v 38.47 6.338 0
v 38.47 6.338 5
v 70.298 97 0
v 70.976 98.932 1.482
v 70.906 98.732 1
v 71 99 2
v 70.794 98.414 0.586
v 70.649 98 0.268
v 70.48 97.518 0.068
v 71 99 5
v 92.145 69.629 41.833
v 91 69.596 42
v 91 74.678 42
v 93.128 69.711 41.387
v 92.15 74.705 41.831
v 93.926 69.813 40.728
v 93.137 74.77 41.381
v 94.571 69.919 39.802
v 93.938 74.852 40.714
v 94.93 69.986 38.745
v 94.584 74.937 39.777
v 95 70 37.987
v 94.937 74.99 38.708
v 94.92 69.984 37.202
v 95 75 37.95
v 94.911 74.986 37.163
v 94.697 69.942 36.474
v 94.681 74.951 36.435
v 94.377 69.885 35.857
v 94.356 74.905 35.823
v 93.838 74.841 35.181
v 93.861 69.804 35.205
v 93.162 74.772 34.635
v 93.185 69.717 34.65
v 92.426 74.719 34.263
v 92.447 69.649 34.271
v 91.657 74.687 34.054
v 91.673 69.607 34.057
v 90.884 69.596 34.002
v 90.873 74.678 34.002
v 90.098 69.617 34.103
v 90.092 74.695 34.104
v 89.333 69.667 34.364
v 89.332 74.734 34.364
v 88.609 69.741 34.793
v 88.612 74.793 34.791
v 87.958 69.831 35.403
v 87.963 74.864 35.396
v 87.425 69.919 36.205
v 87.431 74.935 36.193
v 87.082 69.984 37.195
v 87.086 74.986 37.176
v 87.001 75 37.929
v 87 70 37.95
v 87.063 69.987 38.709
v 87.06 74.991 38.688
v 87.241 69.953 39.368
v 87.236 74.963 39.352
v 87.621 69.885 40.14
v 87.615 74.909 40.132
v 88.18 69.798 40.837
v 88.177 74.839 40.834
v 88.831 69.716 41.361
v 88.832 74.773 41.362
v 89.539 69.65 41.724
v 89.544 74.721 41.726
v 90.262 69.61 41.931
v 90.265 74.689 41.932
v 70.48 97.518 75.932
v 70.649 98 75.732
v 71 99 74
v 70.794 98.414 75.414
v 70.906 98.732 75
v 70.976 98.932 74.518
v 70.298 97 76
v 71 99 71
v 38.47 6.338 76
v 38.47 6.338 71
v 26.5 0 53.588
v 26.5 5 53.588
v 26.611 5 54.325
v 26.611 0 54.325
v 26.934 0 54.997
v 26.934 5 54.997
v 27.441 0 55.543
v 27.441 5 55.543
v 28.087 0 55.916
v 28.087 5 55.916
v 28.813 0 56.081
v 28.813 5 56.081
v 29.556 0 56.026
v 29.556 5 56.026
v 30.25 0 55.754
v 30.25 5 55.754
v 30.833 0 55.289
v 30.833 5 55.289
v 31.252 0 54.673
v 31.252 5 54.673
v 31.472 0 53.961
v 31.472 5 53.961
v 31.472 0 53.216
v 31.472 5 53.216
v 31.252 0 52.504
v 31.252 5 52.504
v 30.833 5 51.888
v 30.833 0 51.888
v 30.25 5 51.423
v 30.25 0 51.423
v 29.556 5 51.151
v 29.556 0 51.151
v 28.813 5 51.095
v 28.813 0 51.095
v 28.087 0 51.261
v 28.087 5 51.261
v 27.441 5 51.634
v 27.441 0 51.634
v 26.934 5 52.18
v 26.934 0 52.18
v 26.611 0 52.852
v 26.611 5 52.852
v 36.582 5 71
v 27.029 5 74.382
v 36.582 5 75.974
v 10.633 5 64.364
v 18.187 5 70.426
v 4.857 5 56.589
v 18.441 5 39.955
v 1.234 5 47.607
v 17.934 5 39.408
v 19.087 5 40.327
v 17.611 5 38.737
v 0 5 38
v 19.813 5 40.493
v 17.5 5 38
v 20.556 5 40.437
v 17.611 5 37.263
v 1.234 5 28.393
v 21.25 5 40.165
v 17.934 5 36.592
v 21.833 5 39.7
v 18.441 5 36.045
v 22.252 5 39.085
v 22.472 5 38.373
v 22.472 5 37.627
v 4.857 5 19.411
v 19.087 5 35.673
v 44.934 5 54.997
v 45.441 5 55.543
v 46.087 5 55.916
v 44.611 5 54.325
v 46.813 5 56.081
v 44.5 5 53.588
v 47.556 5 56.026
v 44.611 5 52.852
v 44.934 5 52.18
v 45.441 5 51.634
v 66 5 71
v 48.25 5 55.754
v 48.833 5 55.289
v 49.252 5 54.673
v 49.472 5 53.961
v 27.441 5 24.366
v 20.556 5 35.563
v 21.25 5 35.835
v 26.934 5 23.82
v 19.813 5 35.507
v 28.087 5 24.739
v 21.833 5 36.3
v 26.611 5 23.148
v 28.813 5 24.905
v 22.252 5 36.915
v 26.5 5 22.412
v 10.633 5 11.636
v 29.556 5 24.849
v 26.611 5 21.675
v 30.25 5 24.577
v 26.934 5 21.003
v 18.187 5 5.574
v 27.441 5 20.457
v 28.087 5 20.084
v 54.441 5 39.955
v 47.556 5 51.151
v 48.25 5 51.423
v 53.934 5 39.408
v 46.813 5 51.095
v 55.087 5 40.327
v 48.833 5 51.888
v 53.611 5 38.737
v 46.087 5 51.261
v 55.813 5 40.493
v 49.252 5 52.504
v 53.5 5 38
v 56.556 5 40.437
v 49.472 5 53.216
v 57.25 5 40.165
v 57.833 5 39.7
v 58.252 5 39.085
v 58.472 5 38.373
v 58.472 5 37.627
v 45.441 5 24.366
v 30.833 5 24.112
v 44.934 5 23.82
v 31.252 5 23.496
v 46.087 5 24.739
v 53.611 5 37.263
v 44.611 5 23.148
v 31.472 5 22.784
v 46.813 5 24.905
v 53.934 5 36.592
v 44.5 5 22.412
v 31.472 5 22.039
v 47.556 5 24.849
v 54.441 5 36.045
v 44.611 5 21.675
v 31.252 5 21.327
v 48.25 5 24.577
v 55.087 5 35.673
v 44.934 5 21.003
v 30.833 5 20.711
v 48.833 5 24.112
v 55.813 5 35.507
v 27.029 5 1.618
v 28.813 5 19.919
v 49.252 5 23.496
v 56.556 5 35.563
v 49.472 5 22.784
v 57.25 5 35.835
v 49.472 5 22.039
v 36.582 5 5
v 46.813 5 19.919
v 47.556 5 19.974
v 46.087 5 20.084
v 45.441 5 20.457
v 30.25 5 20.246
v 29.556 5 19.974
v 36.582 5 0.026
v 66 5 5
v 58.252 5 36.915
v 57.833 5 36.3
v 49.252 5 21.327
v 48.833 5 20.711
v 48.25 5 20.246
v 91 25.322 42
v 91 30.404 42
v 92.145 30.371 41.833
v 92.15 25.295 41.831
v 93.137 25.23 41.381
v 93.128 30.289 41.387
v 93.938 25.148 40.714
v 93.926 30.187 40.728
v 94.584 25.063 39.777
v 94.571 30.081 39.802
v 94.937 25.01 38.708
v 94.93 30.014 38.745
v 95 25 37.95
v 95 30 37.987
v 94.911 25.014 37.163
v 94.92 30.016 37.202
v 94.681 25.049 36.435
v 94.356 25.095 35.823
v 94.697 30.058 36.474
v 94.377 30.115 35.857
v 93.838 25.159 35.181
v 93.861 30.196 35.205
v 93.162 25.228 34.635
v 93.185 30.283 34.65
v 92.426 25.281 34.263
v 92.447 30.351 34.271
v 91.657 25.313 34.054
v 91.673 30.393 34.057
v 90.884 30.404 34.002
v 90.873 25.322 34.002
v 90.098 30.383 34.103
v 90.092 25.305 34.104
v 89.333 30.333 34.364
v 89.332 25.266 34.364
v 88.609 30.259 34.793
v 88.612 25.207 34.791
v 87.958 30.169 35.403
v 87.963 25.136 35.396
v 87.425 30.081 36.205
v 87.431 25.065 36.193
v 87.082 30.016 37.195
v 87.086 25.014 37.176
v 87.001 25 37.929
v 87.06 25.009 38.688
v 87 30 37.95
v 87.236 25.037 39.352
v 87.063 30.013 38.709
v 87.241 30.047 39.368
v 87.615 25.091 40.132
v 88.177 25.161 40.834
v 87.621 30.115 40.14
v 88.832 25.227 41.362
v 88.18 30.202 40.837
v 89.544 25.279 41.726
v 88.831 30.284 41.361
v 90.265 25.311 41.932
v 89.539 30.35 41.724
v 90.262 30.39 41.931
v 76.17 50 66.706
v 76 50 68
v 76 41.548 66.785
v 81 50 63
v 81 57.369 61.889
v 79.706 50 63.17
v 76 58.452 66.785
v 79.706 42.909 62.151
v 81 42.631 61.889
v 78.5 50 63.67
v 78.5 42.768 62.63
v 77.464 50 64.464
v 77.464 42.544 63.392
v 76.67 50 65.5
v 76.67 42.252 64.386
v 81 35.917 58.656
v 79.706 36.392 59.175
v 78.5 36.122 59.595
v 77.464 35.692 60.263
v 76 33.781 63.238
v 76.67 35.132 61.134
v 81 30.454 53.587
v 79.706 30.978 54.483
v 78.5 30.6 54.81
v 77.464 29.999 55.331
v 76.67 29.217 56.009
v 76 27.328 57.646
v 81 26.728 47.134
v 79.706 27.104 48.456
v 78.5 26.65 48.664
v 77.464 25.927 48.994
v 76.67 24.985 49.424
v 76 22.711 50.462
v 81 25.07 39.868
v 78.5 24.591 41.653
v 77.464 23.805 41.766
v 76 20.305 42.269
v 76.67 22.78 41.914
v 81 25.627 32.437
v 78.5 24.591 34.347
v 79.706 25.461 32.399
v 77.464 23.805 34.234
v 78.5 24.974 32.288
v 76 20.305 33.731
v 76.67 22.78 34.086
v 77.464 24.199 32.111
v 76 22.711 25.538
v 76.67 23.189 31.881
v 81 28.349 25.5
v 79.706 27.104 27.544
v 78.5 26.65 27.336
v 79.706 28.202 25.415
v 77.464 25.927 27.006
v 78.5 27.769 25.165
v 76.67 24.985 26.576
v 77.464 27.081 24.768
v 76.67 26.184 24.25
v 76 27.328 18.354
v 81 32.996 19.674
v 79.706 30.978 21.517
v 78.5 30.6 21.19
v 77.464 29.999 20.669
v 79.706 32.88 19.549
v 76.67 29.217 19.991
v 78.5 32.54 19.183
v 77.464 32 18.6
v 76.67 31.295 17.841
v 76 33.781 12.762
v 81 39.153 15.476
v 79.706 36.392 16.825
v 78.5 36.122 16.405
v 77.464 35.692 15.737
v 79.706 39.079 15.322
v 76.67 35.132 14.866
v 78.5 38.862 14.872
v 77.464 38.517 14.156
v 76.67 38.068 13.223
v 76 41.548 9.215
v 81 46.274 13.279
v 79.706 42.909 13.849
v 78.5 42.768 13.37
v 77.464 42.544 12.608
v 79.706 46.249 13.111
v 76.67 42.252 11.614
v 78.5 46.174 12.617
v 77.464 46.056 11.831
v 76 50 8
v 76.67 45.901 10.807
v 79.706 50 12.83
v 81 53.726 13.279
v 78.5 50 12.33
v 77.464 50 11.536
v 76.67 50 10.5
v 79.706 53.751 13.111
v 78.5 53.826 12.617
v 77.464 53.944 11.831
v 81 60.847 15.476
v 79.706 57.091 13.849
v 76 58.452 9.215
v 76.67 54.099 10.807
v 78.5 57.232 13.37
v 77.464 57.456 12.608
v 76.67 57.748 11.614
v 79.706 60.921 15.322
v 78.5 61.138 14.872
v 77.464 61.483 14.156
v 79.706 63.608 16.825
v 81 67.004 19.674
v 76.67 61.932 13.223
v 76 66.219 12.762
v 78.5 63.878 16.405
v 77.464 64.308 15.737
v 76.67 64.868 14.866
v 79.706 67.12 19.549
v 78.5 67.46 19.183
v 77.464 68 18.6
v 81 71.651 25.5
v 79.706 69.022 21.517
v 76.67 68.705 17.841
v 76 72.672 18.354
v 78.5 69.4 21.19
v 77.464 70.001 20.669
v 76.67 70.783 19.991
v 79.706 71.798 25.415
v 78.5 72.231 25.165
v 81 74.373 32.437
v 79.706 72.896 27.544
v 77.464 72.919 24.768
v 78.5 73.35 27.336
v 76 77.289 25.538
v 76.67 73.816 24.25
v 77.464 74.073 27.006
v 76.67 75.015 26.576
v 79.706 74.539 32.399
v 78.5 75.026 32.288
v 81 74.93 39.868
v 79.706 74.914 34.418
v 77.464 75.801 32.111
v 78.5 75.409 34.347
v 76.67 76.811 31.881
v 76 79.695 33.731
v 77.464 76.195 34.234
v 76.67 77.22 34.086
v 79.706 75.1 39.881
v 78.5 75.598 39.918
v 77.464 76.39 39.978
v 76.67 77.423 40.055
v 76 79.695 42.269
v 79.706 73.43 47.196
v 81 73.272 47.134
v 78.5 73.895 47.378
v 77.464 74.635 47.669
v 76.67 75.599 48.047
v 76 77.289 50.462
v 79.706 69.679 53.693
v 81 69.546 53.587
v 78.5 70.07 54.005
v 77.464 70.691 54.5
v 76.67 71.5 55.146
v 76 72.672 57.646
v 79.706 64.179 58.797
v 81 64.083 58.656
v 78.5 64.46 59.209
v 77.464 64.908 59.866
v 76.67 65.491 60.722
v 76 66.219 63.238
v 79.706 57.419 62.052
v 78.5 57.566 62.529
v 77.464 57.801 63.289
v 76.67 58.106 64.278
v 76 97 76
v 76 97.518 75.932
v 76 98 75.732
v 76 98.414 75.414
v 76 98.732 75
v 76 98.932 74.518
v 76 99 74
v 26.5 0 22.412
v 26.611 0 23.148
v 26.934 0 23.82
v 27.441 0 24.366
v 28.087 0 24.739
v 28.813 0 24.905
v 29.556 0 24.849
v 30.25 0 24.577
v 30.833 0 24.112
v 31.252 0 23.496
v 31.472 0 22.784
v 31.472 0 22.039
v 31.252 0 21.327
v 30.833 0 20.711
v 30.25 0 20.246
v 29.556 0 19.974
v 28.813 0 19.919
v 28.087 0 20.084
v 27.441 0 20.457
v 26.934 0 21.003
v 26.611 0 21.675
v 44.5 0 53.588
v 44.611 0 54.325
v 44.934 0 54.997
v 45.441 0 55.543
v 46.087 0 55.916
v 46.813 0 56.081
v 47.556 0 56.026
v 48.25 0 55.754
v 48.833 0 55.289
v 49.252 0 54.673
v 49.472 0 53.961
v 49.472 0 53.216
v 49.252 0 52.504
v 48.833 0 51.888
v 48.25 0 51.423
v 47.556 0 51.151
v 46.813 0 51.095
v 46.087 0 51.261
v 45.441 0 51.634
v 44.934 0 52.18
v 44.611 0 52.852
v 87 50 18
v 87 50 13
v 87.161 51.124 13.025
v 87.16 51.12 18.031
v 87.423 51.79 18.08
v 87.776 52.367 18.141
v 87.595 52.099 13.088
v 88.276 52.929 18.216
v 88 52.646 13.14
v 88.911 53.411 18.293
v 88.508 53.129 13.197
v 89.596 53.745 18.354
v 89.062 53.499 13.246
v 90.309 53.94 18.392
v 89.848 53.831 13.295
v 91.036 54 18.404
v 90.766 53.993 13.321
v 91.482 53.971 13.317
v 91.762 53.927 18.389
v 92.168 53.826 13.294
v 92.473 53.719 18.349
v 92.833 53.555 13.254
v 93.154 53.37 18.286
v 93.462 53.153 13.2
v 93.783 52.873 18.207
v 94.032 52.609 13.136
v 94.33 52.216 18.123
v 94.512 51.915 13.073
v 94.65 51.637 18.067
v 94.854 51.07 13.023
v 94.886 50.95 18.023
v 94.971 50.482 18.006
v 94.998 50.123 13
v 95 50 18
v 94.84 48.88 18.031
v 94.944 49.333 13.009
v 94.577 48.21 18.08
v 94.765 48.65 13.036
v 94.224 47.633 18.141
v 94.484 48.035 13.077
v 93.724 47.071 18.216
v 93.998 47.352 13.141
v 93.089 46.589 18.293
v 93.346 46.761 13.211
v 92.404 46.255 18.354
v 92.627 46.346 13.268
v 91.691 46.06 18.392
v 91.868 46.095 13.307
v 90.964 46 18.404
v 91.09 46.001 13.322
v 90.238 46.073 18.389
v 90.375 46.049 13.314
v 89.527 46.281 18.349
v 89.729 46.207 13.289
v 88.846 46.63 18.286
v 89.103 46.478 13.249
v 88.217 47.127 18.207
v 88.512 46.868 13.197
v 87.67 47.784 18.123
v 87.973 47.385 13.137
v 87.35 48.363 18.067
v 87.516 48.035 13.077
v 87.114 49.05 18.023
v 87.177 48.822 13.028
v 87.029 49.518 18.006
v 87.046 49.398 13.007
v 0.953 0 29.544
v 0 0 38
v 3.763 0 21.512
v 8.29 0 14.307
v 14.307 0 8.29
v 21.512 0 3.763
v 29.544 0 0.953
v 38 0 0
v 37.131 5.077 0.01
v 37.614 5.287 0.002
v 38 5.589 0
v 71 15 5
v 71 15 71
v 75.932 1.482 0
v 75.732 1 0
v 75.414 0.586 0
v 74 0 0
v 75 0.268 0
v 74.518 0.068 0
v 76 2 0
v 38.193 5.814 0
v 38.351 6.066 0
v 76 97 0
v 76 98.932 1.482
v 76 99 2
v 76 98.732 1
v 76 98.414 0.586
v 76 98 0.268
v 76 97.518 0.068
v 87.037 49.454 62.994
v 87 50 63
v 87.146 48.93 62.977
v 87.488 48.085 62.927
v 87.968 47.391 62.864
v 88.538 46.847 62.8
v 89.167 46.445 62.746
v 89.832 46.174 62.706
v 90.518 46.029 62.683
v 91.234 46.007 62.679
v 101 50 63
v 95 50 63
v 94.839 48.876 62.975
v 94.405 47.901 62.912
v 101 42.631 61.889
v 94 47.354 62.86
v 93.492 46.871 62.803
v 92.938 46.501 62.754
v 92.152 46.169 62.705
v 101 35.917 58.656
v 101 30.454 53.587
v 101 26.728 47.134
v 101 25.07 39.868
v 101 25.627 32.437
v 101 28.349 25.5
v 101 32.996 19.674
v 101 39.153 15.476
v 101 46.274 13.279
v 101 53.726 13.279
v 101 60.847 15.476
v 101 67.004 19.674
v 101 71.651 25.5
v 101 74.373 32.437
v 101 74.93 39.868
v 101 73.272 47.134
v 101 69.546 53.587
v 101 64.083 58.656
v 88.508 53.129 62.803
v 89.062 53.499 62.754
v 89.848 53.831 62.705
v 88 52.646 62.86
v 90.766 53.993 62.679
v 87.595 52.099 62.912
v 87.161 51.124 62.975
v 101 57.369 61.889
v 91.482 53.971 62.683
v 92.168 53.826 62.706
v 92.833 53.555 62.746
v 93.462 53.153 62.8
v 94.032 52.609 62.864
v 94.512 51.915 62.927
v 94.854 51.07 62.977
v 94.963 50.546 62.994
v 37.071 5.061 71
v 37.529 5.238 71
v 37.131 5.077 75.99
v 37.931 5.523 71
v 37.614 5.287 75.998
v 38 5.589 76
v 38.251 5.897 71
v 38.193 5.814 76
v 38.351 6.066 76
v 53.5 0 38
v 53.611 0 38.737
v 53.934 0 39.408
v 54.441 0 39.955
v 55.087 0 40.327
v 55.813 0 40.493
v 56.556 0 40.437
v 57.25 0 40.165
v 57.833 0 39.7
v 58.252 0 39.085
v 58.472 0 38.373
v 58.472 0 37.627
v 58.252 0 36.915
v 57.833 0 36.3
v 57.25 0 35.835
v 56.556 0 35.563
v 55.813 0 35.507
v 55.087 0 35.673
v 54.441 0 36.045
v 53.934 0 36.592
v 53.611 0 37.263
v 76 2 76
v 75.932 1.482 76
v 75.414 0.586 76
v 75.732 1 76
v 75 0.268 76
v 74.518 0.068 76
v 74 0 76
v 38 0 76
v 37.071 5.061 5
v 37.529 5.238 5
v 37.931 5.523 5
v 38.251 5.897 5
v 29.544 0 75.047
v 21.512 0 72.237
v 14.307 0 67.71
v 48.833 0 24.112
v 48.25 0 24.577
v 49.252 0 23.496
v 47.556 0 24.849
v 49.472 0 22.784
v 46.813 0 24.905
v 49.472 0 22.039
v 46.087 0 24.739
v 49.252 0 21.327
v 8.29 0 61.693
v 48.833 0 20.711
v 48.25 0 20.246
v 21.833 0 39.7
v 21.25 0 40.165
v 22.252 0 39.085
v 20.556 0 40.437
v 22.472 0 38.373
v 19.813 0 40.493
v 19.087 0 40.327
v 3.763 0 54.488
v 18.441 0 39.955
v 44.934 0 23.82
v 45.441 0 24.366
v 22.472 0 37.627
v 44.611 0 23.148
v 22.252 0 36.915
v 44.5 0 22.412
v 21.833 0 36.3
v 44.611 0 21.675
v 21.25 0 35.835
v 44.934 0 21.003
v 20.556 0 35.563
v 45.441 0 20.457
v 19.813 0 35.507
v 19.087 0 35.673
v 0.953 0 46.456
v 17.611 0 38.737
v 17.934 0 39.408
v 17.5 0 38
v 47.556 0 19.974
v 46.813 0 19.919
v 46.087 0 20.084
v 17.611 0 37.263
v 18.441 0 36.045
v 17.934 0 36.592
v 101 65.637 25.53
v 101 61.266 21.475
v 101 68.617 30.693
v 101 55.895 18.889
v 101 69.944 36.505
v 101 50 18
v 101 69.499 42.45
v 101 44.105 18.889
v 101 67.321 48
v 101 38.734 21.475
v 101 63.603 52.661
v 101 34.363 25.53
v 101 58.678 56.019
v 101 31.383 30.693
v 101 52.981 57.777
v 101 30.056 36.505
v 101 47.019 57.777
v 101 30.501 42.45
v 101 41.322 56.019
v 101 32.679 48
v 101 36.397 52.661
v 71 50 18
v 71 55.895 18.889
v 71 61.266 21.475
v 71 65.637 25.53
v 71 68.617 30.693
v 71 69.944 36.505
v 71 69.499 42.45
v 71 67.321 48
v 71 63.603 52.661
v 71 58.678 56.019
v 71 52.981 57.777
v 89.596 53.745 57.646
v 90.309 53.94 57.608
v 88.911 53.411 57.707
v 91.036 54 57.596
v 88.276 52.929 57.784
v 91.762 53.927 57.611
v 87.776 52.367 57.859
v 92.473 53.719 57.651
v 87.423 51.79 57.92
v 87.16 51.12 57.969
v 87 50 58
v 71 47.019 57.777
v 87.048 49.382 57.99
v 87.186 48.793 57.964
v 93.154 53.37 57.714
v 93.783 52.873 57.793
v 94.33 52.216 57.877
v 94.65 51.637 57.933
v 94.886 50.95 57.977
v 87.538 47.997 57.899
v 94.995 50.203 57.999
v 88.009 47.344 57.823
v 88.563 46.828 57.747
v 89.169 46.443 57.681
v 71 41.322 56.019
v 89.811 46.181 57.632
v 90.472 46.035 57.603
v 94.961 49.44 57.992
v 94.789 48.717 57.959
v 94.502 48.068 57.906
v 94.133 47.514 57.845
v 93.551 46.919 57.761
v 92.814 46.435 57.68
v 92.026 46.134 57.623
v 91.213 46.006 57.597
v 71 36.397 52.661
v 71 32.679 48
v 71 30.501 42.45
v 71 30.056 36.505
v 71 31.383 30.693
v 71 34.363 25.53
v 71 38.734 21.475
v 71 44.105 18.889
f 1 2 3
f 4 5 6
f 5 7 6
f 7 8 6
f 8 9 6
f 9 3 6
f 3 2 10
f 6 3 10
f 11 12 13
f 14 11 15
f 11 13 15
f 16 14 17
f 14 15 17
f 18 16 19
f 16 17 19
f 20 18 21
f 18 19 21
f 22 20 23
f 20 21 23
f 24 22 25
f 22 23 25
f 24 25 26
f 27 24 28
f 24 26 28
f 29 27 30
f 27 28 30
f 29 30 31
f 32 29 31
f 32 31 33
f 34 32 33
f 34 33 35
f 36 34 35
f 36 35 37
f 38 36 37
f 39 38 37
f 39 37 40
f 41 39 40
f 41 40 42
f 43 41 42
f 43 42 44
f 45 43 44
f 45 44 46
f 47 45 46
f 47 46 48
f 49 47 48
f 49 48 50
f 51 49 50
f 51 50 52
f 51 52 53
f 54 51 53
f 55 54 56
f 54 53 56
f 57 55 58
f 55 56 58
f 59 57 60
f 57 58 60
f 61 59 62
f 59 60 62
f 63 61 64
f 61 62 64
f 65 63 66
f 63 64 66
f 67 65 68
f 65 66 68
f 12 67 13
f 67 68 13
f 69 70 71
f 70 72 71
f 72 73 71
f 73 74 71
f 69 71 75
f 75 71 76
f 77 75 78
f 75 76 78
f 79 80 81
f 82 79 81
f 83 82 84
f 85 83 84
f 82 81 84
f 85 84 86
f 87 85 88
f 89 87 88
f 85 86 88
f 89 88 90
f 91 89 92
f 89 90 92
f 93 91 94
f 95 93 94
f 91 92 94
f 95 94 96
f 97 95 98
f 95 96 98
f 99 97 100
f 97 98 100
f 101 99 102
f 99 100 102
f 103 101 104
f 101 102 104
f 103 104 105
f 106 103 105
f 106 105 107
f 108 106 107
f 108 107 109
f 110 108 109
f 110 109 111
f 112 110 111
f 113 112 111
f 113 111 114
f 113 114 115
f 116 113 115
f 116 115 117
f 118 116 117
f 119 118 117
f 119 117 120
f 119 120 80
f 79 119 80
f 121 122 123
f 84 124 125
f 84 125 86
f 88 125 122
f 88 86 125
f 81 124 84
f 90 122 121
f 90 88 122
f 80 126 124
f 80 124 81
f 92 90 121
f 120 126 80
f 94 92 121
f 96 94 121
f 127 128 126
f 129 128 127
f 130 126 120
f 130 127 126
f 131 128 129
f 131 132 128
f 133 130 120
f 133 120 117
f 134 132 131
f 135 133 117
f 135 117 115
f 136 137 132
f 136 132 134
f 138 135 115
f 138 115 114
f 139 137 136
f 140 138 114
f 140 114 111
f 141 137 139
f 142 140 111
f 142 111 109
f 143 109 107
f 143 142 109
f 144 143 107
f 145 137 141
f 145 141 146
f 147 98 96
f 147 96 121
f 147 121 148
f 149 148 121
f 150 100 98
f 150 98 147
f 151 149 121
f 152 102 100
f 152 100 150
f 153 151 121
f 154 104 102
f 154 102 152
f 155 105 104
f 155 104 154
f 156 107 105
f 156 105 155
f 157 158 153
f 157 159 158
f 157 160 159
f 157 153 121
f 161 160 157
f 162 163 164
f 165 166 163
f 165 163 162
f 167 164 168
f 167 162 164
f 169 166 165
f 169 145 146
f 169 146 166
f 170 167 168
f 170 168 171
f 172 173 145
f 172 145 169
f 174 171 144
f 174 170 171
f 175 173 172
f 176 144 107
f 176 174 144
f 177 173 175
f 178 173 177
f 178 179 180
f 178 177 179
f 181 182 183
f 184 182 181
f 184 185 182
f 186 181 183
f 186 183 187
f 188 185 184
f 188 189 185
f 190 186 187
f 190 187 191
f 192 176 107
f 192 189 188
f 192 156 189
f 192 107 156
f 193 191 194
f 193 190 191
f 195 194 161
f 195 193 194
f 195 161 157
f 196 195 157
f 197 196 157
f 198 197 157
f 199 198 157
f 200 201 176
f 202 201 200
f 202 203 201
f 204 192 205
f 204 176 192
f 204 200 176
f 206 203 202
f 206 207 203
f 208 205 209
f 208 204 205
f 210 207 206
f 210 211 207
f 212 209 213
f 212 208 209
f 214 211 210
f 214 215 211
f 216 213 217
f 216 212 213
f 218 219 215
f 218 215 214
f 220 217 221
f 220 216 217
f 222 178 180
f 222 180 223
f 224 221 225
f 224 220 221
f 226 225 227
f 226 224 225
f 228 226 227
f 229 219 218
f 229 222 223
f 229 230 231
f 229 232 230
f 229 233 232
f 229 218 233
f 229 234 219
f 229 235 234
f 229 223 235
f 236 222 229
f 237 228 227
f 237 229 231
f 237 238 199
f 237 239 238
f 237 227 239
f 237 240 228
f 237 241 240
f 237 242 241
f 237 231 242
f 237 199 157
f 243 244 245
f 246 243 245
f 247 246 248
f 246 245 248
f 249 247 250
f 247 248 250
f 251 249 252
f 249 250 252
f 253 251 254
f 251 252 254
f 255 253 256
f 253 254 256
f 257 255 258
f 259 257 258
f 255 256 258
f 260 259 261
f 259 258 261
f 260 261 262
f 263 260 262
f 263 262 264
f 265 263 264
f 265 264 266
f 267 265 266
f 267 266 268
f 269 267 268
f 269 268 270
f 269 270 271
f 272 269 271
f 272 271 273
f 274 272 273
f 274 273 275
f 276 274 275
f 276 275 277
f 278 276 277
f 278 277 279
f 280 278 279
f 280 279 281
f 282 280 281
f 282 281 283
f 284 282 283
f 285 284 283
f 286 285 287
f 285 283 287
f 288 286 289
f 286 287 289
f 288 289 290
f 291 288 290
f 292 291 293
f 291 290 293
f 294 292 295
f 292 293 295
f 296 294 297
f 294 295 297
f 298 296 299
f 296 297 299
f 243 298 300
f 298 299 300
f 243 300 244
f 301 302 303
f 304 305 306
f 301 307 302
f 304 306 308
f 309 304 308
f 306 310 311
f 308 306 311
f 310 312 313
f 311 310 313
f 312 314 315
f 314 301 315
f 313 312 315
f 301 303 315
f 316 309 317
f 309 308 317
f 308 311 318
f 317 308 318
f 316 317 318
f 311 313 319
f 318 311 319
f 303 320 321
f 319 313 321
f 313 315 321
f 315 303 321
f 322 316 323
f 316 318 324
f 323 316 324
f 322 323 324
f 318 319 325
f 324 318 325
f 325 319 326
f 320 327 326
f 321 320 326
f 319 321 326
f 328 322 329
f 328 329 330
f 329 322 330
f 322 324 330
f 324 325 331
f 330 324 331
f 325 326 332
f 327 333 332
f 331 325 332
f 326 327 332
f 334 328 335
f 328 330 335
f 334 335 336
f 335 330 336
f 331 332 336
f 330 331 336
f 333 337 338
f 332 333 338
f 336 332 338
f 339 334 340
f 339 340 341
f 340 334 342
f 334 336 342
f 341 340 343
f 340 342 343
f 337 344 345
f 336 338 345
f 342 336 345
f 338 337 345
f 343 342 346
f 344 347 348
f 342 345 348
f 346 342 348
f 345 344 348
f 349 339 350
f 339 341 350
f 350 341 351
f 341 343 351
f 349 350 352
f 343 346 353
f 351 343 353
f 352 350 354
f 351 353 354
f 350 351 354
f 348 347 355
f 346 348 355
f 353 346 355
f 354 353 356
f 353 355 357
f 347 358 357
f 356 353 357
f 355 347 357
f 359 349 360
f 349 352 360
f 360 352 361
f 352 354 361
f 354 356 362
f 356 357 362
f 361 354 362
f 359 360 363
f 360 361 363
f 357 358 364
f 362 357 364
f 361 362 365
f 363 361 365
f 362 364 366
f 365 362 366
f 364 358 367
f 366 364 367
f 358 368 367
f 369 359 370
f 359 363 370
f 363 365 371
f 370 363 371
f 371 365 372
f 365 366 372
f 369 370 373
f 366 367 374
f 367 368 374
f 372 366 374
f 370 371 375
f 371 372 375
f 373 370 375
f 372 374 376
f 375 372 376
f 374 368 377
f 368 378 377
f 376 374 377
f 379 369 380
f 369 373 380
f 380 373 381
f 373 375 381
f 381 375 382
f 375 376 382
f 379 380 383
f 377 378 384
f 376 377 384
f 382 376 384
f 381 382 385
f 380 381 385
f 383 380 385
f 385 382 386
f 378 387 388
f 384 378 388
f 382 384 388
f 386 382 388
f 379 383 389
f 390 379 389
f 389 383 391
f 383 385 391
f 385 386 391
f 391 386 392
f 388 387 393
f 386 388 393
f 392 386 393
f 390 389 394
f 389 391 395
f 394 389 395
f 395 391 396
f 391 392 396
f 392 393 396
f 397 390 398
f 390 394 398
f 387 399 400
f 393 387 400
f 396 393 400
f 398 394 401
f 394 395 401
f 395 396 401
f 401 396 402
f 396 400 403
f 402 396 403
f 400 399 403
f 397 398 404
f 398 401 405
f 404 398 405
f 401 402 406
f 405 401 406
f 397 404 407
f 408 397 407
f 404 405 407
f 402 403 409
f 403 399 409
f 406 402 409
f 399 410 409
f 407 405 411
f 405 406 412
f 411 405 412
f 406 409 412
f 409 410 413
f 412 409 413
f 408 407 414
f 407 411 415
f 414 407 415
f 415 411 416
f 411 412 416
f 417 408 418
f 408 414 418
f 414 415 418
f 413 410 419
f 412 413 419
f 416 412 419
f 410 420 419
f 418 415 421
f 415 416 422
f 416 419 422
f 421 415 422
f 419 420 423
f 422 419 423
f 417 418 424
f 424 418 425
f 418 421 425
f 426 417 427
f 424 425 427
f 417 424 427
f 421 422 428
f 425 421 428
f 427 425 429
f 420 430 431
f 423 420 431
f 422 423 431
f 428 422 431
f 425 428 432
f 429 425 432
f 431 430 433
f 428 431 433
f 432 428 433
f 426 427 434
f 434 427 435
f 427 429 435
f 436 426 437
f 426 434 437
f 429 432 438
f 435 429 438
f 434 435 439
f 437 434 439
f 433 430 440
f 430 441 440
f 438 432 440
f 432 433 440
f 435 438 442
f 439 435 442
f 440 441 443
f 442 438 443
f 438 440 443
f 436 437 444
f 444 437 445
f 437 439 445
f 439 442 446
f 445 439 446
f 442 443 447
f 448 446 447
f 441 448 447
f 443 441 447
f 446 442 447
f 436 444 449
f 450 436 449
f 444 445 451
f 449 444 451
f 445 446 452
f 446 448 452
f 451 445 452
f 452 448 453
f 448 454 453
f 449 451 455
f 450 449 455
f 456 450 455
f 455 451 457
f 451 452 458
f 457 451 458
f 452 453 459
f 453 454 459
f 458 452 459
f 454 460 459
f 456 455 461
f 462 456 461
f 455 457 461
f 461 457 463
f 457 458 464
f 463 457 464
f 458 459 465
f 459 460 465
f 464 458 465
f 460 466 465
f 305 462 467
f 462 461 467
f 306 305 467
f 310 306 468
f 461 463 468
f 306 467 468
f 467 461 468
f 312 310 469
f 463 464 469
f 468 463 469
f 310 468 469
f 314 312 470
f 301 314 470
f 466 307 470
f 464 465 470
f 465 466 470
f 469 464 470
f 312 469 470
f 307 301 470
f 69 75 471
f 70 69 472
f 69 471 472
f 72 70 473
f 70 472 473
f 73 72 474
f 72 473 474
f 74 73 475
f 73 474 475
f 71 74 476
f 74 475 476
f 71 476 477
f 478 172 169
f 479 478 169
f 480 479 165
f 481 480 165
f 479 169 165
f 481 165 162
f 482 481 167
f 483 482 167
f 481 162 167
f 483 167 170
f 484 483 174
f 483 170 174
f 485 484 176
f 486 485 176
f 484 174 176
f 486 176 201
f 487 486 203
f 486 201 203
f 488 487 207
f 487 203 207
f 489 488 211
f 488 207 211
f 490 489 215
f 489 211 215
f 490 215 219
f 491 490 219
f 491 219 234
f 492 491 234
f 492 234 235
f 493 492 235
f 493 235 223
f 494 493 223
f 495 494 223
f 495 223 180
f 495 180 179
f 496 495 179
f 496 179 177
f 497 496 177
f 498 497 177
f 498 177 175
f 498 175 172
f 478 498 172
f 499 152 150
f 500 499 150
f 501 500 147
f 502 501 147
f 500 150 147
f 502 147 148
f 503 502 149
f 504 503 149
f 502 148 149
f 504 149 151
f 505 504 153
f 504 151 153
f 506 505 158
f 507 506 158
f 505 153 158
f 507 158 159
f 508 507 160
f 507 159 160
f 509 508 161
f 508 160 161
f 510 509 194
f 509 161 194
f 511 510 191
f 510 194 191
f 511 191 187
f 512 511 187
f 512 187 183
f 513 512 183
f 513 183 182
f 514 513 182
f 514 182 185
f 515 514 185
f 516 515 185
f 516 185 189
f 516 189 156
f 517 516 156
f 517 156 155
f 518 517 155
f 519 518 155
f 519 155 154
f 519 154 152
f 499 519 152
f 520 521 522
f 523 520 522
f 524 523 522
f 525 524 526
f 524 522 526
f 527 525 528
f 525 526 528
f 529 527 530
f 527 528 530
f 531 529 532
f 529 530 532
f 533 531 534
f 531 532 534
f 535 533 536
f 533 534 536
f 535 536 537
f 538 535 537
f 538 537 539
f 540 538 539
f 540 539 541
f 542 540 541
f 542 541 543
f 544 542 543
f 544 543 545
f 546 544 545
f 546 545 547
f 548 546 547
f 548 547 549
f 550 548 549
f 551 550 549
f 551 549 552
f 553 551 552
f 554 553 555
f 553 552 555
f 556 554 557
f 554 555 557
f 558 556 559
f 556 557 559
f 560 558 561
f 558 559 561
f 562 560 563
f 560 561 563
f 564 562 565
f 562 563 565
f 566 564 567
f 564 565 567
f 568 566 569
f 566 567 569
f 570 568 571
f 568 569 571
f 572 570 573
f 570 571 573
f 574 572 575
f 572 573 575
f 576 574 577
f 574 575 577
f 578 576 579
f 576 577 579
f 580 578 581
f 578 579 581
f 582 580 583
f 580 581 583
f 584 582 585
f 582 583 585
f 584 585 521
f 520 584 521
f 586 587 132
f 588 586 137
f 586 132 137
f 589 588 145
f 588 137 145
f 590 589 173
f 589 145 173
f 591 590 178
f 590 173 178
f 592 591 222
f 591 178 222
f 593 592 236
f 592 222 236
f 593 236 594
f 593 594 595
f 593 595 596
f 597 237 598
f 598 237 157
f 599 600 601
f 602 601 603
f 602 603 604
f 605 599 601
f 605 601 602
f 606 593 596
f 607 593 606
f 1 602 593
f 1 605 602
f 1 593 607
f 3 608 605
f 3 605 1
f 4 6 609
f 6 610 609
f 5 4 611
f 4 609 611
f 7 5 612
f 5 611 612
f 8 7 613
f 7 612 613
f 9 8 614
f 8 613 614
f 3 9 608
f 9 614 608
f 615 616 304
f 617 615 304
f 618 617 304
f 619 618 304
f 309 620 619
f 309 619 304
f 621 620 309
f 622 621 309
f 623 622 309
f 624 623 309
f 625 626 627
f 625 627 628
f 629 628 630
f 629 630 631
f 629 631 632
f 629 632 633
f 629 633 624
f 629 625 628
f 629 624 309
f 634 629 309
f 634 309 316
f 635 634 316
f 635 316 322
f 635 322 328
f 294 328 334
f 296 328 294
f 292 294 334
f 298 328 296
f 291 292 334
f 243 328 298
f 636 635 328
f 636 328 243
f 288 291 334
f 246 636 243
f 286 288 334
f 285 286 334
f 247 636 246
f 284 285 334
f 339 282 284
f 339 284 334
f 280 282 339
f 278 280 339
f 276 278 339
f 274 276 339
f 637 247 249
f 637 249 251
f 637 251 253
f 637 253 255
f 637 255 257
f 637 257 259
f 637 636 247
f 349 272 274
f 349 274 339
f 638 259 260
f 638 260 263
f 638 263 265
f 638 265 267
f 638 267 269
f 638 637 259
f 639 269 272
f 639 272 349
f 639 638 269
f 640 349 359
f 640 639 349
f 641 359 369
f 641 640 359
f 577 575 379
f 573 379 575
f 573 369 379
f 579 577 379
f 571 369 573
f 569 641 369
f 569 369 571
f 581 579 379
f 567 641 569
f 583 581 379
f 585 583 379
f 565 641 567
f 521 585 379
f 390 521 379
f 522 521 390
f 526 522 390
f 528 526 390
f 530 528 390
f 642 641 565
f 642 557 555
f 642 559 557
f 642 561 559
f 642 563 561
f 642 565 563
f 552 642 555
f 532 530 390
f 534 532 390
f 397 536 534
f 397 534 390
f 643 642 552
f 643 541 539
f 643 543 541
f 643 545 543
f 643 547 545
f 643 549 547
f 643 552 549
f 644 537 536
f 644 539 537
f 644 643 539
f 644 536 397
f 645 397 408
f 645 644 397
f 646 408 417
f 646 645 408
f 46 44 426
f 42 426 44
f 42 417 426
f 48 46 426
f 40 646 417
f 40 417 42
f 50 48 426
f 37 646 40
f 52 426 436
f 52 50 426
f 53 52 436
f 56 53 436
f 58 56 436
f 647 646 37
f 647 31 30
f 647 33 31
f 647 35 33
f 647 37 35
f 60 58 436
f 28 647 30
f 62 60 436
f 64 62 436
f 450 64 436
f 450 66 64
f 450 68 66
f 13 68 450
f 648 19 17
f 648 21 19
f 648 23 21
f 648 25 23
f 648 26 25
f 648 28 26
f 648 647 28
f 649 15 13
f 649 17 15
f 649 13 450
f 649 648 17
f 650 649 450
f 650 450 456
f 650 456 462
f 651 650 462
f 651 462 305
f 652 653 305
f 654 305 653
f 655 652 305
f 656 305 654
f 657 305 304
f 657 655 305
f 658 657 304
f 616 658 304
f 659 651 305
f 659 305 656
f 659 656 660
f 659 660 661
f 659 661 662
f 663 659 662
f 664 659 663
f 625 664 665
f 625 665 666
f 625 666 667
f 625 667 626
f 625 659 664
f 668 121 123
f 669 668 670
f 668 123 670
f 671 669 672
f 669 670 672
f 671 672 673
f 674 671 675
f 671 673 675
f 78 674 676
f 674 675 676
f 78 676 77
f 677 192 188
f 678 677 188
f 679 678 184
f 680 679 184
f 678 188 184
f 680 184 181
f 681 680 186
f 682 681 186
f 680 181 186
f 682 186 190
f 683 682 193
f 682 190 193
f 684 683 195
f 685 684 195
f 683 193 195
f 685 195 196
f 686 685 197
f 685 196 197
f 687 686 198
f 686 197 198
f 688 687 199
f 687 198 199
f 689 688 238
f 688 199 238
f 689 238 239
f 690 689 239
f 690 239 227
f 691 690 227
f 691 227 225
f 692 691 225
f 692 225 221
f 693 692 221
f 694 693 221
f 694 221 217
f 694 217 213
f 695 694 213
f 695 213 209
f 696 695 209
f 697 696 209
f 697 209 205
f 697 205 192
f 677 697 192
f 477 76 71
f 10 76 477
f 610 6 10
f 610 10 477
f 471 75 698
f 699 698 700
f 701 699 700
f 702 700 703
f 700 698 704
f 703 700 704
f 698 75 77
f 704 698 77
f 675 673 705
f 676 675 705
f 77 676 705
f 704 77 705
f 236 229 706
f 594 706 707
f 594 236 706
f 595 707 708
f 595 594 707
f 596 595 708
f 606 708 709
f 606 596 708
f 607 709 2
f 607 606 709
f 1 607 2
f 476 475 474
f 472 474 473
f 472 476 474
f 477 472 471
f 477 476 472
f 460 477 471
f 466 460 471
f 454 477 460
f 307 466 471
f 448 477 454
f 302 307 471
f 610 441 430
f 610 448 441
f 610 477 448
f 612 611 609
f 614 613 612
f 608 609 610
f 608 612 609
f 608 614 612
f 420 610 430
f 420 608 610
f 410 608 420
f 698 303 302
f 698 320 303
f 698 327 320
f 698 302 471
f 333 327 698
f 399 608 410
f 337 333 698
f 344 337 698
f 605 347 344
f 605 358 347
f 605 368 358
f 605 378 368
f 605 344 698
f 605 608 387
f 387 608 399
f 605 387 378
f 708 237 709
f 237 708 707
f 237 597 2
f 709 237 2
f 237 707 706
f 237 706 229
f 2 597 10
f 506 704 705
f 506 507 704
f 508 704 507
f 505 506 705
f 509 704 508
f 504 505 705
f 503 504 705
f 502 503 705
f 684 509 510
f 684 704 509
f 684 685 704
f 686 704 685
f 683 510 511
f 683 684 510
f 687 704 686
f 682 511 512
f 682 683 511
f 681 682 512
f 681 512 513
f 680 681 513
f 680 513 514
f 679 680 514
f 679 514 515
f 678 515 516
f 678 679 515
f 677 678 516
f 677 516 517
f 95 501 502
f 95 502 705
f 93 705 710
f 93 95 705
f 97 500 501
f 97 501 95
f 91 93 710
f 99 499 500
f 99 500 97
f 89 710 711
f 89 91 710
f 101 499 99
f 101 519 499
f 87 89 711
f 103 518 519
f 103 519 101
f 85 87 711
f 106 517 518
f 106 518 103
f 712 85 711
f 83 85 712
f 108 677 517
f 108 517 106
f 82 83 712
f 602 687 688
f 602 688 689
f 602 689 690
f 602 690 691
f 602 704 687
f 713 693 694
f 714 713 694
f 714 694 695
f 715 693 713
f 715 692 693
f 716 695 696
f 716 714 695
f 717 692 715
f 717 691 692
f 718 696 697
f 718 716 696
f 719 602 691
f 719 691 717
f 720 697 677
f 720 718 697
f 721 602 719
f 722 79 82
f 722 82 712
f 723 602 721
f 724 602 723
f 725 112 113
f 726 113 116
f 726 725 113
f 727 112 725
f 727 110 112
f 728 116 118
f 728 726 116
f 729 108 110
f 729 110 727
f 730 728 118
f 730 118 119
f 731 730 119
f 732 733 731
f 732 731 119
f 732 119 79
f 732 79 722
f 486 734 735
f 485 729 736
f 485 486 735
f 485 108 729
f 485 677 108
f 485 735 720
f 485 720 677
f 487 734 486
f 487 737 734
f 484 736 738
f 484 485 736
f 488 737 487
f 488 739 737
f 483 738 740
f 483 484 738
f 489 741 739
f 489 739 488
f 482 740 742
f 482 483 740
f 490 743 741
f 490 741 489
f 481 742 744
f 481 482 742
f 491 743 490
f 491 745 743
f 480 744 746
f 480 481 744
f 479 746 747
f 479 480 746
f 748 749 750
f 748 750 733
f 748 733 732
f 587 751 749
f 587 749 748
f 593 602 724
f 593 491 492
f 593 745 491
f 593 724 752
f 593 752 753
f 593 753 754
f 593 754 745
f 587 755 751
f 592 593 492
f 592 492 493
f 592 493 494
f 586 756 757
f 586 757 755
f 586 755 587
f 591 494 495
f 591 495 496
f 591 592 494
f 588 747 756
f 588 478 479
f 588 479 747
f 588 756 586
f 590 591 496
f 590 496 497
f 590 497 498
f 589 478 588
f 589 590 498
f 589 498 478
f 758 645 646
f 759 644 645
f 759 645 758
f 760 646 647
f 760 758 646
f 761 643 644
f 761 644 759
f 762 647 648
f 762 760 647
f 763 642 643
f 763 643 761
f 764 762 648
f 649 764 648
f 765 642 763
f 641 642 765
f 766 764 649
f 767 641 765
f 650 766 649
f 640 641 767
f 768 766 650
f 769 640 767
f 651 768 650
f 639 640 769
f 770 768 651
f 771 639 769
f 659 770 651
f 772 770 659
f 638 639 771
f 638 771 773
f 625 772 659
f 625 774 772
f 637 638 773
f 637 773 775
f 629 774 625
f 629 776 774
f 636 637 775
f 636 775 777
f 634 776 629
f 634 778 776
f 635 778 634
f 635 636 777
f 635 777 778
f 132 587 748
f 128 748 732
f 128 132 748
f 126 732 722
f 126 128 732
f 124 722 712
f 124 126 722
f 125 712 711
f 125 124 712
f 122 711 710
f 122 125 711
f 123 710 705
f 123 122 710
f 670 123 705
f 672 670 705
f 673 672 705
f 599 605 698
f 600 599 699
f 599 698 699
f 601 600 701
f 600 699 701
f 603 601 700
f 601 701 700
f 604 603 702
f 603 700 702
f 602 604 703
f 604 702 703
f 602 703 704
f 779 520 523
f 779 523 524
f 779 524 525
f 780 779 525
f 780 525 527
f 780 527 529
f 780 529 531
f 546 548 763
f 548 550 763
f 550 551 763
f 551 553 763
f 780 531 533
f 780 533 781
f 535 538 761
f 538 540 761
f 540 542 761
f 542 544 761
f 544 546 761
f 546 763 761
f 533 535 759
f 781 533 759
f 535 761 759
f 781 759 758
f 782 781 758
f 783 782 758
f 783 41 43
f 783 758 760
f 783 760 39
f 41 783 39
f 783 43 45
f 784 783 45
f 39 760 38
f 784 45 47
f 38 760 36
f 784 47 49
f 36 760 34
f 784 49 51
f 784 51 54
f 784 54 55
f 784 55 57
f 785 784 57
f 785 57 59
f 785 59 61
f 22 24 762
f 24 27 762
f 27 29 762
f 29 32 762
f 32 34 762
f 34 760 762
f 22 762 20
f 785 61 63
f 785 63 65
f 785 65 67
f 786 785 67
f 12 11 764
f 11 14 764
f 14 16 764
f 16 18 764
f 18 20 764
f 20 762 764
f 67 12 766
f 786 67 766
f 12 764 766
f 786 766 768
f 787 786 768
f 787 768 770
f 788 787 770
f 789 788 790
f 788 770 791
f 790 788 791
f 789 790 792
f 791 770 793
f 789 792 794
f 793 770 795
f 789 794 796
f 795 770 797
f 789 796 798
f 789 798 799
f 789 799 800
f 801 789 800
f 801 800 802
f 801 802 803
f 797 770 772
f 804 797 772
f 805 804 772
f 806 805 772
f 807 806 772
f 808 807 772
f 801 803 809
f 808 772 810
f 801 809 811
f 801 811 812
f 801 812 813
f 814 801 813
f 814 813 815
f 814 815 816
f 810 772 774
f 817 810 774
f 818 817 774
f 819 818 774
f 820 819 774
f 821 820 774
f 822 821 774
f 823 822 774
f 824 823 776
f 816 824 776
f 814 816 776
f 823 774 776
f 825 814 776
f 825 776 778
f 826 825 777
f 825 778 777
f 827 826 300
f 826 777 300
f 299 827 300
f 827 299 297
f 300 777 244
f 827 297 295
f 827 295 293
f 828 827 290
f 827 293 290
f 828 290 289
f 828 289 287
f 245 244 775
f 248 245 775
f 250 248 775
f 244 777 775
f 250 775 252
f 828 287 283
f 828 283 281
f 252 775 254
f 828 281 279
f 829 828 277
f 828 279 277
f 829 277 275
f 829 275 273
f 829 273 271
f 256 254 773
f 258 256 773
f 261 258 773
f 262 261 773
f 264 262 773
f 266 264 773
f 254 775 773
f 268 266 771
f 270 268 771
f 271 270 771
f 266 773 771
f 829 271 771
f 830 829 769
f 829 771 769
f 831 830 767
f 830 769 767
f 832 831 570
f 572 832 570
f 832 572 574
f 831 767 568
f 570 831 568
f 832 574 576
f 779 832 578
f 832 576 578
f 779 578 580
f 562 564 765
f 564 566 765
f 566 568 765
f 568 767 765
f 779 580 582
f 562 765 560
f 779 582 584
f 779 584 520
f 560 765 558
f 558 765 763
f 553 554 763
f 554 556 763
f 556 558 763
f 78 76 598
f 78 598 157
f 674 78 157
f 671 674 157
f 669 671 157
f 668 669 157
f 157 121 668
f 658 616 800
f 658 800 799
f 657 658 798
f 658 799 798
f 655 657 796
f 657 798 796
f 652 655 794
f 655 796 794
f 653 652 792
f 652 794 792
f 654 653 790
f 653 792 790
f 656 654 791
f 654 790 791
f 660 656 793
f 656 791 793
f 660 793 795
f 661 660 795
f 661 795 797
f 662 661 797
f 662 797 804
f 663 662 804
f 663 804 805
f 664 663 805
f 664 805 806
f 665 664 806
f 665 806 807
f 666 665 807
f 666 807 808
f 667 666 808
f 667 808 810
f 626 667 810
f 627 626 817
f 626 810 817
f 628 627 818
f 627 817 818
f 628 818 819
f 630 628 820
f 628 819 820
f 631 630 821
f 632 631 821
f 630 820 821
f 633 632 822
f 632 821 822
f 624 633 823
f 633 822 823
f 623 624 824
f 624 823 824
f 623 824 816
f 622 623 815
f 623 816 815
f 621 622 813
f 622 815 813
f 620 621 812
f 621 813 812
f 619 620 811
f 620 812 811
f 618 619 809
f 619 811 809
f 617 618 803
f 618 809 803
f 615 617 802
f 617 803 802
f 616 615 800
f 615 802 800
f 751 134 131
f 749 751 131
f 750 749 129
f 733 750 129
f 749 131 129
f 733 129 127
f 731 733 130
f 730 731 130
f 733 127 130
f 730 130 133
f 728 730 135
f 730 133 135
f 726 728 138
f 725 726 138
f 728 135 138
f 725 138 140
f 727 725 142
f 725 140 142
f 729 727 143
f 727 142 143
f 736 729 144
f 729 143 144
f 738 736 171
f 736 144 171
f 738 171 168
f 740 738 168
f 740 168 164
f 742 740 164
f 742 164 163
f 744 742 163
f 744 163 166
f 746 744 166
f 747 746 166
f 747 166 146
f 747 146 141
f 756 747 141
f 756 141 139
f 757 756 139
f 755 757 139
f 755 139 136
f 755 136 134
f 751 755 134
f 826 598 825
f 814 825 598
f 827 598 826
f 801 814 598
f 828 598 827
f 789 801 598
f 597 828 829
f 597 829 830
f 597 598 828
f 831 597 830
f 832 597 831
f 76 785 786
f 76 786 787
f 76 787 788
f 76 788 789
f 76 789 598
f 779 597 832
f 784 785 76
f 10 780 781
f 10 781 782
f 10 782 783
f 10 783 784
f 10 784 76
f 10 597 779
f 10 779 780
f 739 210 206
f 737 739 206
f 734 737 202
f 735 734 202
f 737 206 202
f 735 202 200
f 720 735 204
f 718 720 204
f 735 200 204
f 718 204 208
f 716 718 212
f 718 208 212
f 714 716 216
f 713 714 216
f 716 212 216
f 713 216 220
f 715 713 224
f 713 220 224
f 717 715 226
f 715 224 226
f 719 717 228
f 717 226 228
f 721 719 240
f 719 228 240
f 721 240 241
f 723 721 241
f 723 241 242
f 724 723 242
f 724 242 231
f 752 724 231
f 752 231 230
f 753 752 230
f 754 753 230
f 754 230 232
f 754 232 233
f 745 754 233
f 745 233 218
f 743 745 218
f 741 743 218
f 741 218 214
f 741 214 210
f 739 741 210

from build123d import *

# Parameters (mm, degrees)
EXTRUDE_1_DEPTH     = 76
FILLET_1_R          = 38
RIB_1_REACH         = 148.127
SKETCH_4_WALL_W     = 393.877609006
SKETCH_4_WALL_H     = 5
RIB_START           = -5
RIB_2_DEPTH         = 5
SKETCH_7_R          = 2.5
CUT_EXTRUDE_1_DEPTH = 10
FILLET_2_R          = 2
CHAMFER_1_SIZE      = 10
CHAMFER_1_SIZE2     = 5
FILLET_3_R          = 2
FILLET_4_R          = 2
SKETCH_8_R          = 20
CUT_EXTRUDE_2_DEPTH = 5
EXTRUDE_START       = 25
SKETCH_8_6_R        = 25
SKETCH_8_6_R_2      = 20
EXTRUDE_4_DEPTH     = 25
FILLET_5_R          = 5
SKETCH_13_R         = 4
CUT_EXTRUDE_3_DEPTH = 76
SKETCH_14_R         = 4
CUT_EXTRUDE_4_DEPTH = 76


with BuildPart() as part:
    # Эскиз3 → Бобышка-Вытянуть1 (new body)
    with BuildSketch(Plane.XY):
        Polygon((76, 0), (0, 0), (0, 5), (71, 5), (71, 99), (76, 99), align=None)
    extrude(amount=EXTRUDE_1_DEPTH)

    # Скругление1
    fillet_1_edges = [part.edges().sort_by_distance(p)[0] for p in [
        (0, 2.5, 0),
        (0, 2.5, 76),
    ]]
    fillet(fillet_1_edges, radius=FILLET_1_R - 0.0001)  # a hair under: the kernel refuses the full size

    # Эскиз4 wall → Ребро1 (add, up to next)
    with BuildSketch(Plane(origin=(54.5, 52, 76), x_dir=(-0.331244504731, -0.94354495287, 0), z_dir=(0.94354495287, -0.331244504731, 0)), mode=Mode.PRIVATE) as rib_1_sk1:
        with Locations((0, 2.5)):
            Rectangle(SKETCH_4_WALL_W, SKETCH_4_WALL_H)
    rib_1_tool1 = extrude(rib_1_sk1.sketch, amount=RIB_1_REACH, mode=Mode.PRIVATE) - part.part
    add(rib_1_tool1.solids().sort_by_distance((54.5, 52, 76))[0])

    # Ребро2: read off the stored shape, not the designer's step
    # Ребро2 outline → Ребро2 (add)
    with BuildSketch(Plane(origin=(0, 0, 0), x_dir=(-1, 0, 0), z_dir=(0, 0, -1)).offset(RIB_START)):
        Polygon((-38, 5), (-71, 99), (-71, 5), align=None)
    extrude(amount=RIB_2_DEPTH)

    # Эскиз7 → Вырез-Вытянуть1 (cut)
    with BuildSketch(Plane(origin=(0, 5, 0), x_dir=(1, 0, 0), z_dir=(0, 1, 0))):
        with Locations(Location((20, -38, 0), (0, 0, 180))):
            Circle(SKETCH_7_R)
        with Locations(Location((29, -22.411542732, 0), (0, 0, 180))):
            Circle(SKETCH_7_R)
        with Locations(Location((47, -22.411542732, 0), (0, 0, 180))):
            Circle(SKETCH_7_R)
        with Locations(Location((56, -38, 0), (0, 0, 180))):
            Circle(SKETCH_7_R)
        with Locations(Location((47, -53.588457268, 0), (0, 0, 180))):
            Circle(SKETCH_7_R)
        with Locations(Location((29, -53.588457268, 0), (0, 0, 180))):
            Circle(SKETCH_7_R)
    extrude(amount=-CUT_EXTRUDE_1_DEPTH, mode=Mode.SUBTRACT)

    # Скругление2
    fillet_2_edges = [part.edges().sort_by_distance(p)[0] for p in [
        (76, 0, 38),
    ]]
    fillet(fillet_2_edges, radius=FILLET_2_R)

    # Фаска1
    chamfer_1_edges = [part.edges().sort_by_distance(p)[0] for p in [
        (71, 5, 38),
    ]]
    chamfer_1_side = [part.faces().sort_by_distance(p)[0] for p in [
        (71, 52, 38),
    ]]
    chamfer(chamfer_1_edges, length=CHAMFER_1_SIZE, length2=CHAMFER_1_SIZE2, reference=chamfer_1_side[0])

    # Скругление3
    fillet_3_edges = [part.edges().sort_by_distance(p)[0] for p in [
        (38, 5, 73.5),
        (38, 5, 2.5),
    ]]
    fillet(fillet_3_edges, radius=FILLET_3_R)

    # Скругление4
    fillet_4_edges = [part.edges().sort_by_distance(p)[0] for p in [
        (73.5, 99, 76),
        (73.5, 99, 0),
    ]]
    fillet(fillet_4_edges, radius=FILLET_4_R)

    # Эскиз8 → Вырез-Вытянуть2 (cut)
    with BuildSketch(Plane(origin=(76, 0, 0), x_dir=(0, 0, -1), z_dir=(1, 0, 0))):
        with Locations((-38, 50)):
            Circle(SKETCH_8_R)
    extrude(amount=-CUT_EXTRUDE_2_DEPTH, mode=Mode.SUBTRACT)

    # Эскиз8<6> → Бобышка-Вытянуть4 (add)
    with BuildSketch(Plane(origin=(76, 0, 0), x_dir=(0, 0, -1), z_dir=(1, 0, 0)).offset(EXTRUDE_START)):
        with Locations(Location((-38, 50, 0), (0, 0, 180))):
            Circle(SKETCH_8_6_R)
        with Locations((-38, 50)):
            Circle(SKETCH_8_6_R_2, mode=Mode.SUBTRACT)
    extrude(amount=-EXTRUDE_4_DEPTH)

    # Скругление5
    fillet_5_edges = [part.edges().sort_by_distance(p)[0] for p in [
        (76, 50, 13),
    ]]
    fillet(fillet_5_edges, radius=FILLET_5_R)

    # Эскиз13 → Вырез-Вытянуть3 (cut)
    with BuildSketch(Plane(origin=(0, 0, 0), x_dir=(-1, 0, 0), z_dir=(0, 0, -1))):
        with Locations((-91, 50)):
            Circle(SKETCH_13_R)
    extrude(amount=-CUT_EXTRUDE_3_DEPTH, mode=Mode.SUBTRACT)

    # Эскиз14 → Вырез-Вытянуть4 (cut)
    with BuildSketch(Plane(origin=(0, 99, 0), x_dir=(1, 0, 0), z_dir=(0, 1, 0))):
        with Locations(Location((91, -38, 0), (0, 0, 270))):
            Circle(SKETCH_14_R)
    extrude(amount=-CUT_EXTRUDE_4_DEPTH, mode=Mode.SUBTRACT)


solid = part.part
